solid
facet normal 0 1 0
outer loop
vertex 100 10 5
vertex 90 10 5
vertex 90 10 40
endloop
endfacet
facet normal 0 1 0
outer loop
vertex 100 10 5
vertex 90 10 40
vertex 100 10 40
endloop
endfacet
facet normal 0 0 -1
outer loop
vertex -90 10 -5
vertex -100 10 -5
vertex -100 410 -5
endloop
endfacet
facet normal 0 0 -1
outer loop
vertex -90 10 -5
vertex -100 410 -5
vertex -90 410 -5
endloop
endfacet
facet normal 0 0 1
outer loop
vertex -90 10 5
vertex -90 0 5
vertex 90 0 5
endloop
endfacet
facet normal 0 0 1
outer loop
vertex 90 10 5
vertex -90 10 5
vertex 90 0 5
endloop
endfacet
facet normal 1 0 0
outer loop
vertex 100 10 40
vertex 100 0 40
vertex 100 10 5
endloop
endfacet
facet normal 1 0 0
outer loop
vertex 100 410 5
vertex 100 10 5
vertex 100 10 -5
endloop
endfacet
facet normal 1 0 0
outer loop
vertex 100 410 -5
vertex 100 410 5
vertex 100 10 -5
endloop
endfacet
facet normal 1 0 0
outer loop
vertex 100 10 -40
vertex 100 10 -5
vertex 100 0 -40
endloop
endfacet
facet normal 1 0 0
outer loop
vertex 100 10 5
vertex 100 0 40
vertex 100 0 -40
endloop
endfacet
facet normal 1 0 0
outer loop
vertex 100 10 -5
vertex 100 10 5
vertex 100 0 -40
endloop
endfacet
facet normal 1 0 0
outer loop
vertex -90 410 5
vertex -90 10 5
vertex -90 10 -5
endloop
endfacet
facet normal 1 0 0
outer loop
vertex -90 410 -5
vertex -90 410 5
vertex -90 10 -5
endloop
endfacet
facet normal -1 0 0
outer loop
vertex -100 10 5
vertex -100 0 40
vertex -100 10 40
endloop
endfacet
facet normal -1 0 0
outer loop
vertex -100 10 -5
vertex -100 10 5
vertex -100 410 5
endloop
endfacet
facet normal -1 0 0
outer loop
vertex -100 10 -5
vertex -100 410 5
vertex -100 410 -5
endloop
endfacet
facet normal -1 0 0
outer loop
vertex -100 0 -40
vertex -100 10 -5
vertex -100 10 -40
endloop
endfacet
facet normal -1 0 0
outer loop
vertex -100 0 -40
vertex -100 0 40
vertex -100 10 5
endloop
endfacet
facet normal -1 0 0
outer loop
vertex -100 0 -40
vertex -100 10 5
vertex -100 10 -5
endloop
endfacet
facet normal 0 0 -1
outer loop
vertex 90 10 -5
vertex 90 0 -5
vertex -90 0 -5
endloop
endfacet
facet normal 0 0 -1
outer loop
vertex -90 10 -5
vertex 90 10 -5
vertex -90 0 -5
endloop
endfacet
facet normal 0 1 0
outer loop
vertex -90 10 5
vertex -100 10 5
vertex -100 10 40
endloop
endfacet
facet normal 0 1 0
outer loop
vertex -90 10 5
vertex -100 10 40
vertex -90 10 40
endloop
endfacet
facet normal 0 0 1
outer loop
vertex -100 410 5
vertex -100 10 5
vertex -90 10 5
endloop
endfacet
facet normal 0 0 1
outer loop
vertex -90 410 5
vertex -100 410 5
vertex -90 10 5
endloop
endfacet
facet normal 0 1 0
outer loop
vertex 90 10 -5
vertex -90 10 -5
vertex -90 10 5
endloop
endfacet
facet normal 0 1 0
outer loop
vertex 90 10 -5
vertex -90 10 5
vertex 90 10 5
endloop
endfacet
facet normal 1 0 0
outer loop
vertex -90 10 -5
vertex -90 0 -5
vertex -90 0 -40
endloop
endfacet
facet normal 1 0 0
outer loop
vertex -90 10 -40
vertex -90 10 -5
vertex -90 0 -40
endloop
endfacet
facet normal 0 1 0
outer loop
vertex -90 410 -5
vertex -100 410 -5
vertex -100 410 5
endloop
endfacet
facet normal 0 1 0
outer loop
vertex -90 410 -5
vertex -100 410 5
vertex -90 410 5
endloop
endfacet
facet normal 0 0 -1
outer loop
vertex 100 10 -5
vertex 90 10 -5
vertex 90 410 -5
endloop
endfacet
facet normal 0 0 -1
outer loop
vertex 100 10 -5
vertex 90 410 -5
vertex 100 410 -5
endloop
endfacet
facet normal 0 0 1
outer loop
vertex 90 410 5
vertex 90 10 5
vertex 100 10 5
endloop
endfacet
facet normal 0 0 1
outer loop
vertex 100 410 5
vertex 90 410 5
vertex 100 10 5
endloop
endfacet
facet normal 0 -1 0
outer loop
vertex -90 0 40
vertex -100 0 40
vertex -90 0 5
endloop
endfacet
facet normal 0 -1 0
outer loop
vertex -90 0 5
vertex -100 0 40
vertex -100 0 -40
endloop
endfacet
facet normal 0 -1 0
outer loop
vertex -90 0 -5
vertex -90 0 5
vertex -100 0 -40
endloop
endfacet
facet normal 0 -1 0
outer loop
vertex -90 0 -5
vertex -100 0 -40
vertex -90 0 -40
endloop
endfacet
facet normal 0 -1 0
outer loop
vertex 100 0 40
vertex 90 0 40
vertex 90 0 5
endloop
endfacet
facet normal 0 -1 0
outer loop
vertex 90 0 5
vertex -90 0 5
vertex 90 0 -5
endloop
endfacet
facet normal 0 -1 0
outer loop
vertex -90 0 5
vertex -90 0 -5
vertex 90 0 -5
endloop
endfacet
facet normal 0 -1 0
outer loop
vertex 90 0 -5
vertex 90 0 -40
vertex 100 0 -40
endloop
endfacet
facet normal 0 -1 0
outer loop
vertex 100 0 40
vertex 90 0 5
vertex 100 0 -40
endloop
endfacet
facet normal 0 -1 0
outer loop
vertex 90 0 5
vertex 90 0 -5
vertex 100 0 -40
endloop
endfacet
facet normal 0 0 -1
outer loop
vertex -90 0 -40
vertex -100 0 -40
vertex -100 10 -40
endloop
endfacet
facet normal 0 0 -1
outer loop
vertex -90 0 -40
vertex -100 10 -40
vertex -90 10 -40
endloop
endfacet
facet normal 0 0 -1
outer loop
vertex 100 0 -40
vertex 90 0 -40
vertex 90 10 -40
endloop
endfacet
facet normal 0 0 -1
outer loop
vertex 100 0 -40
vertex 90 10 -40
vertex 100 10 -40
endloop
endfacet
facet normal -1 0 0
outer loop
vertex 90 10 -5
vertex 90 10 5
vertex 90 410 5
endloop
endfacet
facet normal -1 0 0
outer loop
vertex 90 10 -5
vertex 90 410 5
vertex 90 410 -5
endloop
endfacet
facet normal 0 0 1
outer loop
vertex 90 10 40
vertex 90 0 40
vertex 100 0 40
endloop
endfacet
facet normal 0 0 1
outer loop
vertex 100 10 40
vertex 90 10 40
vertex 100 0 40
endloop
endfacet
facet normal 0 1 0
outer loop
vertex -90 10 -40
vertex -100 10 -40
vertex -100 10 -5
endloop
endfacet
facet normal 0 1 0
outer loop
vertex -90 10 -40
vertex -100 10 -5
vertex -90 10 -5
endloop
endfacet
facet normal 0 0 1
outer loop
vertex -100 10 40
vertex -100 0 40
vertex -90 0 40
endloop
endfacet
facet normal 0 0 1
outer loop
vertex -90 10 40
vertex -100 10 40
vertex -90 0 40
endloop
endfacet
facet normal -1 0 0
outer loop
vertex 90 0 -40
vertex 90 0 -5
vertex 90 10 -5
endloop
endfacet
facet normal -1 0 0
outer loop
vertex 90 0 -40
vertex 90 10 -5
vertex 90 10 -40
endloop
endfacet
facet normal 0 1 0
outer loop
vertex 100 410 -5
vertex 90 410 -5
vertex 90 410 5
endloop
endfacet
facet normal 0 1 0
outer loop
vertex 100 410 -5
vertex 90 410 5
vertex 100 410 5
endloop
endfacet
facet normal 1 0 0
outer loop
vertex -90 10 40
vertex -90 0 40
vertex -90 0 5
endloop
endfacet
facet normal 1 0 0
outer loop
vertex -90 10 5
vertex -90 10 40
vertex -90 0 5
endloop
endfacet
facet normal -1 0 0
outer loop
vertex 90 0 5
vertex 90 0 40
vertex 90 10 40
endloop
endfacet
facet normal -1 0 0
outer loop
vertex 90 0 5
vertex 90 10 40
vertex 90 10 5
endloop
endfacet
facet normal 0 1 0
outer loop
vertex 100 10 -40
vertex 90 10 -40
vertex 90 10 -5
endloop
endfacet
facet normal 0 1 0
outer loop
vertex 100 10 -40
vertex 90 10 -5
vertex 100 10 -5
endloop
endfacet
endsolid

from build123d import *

# Parameters (mm, degrees)
SKETCH_1_W      = 10
SKETCH_1_H      = 10
SKETCH_1_W_2    = 180
SKETCH_1_H_2    = 35
EXTRUDE_1_DEPTH = 10
SKETCH_2_W      = 10
SKETCH_2_H      = 10
EXTRUDE_2_DEPTH = 400


with BuildPart() as part:
    # 草图1 → 凸台-拉伸1 (new body)
    with BuildSketch(Plane(origin=(0, 0, 0), x_dir=(1, 0, 0), z_dir=(0, 1, 0))):
        with Locations((-95, 0)):
            Rectangle(SKETCH_1_W, SKETCH_1_H)
        Rectangle(SKETCH_1_W_2, SKETCH_1_H)
        with Locations((-95, -22.5)):
            Rectangle(SKETCH_1_W, SKETCH_1_H_2)
        with Locations((-95, 22.5)):
            Rectangle(SKETCH_1_W, SKETCH_1_H_2)
        with Locations((95, 22.5)):
            Rectangle(SKETCH_1_W, SKETCH_1_H_2)
        with Locations((95, 0)):
            Rectangle(SKETCH_1_W, SKETCH_1_H)
        with Locations((95, -22.5)):
            Rectangle(SKETCH_1_W, SKETCH_1_H_2)
    extrude(amount=EXTRUDE_1_DEPTH)

    # 草图2 → 凸台-拉伸2 (add)
    with BuildSketch(Plane(origin=(0, 10, 0), x_dir=(1, 0, 0), z_dir=(0, 1, 0))):
        with Locations((-95, 0)):
            Rectangle(SKETCH_2_W, SKETCH_2_H)
        with Locations((95, 0)):
            Rectangle(SKETCH_2_W, SKETCH_2_H)
    extrude(amount=EXTRUDE_2_DEPTH)


solid = part.part
